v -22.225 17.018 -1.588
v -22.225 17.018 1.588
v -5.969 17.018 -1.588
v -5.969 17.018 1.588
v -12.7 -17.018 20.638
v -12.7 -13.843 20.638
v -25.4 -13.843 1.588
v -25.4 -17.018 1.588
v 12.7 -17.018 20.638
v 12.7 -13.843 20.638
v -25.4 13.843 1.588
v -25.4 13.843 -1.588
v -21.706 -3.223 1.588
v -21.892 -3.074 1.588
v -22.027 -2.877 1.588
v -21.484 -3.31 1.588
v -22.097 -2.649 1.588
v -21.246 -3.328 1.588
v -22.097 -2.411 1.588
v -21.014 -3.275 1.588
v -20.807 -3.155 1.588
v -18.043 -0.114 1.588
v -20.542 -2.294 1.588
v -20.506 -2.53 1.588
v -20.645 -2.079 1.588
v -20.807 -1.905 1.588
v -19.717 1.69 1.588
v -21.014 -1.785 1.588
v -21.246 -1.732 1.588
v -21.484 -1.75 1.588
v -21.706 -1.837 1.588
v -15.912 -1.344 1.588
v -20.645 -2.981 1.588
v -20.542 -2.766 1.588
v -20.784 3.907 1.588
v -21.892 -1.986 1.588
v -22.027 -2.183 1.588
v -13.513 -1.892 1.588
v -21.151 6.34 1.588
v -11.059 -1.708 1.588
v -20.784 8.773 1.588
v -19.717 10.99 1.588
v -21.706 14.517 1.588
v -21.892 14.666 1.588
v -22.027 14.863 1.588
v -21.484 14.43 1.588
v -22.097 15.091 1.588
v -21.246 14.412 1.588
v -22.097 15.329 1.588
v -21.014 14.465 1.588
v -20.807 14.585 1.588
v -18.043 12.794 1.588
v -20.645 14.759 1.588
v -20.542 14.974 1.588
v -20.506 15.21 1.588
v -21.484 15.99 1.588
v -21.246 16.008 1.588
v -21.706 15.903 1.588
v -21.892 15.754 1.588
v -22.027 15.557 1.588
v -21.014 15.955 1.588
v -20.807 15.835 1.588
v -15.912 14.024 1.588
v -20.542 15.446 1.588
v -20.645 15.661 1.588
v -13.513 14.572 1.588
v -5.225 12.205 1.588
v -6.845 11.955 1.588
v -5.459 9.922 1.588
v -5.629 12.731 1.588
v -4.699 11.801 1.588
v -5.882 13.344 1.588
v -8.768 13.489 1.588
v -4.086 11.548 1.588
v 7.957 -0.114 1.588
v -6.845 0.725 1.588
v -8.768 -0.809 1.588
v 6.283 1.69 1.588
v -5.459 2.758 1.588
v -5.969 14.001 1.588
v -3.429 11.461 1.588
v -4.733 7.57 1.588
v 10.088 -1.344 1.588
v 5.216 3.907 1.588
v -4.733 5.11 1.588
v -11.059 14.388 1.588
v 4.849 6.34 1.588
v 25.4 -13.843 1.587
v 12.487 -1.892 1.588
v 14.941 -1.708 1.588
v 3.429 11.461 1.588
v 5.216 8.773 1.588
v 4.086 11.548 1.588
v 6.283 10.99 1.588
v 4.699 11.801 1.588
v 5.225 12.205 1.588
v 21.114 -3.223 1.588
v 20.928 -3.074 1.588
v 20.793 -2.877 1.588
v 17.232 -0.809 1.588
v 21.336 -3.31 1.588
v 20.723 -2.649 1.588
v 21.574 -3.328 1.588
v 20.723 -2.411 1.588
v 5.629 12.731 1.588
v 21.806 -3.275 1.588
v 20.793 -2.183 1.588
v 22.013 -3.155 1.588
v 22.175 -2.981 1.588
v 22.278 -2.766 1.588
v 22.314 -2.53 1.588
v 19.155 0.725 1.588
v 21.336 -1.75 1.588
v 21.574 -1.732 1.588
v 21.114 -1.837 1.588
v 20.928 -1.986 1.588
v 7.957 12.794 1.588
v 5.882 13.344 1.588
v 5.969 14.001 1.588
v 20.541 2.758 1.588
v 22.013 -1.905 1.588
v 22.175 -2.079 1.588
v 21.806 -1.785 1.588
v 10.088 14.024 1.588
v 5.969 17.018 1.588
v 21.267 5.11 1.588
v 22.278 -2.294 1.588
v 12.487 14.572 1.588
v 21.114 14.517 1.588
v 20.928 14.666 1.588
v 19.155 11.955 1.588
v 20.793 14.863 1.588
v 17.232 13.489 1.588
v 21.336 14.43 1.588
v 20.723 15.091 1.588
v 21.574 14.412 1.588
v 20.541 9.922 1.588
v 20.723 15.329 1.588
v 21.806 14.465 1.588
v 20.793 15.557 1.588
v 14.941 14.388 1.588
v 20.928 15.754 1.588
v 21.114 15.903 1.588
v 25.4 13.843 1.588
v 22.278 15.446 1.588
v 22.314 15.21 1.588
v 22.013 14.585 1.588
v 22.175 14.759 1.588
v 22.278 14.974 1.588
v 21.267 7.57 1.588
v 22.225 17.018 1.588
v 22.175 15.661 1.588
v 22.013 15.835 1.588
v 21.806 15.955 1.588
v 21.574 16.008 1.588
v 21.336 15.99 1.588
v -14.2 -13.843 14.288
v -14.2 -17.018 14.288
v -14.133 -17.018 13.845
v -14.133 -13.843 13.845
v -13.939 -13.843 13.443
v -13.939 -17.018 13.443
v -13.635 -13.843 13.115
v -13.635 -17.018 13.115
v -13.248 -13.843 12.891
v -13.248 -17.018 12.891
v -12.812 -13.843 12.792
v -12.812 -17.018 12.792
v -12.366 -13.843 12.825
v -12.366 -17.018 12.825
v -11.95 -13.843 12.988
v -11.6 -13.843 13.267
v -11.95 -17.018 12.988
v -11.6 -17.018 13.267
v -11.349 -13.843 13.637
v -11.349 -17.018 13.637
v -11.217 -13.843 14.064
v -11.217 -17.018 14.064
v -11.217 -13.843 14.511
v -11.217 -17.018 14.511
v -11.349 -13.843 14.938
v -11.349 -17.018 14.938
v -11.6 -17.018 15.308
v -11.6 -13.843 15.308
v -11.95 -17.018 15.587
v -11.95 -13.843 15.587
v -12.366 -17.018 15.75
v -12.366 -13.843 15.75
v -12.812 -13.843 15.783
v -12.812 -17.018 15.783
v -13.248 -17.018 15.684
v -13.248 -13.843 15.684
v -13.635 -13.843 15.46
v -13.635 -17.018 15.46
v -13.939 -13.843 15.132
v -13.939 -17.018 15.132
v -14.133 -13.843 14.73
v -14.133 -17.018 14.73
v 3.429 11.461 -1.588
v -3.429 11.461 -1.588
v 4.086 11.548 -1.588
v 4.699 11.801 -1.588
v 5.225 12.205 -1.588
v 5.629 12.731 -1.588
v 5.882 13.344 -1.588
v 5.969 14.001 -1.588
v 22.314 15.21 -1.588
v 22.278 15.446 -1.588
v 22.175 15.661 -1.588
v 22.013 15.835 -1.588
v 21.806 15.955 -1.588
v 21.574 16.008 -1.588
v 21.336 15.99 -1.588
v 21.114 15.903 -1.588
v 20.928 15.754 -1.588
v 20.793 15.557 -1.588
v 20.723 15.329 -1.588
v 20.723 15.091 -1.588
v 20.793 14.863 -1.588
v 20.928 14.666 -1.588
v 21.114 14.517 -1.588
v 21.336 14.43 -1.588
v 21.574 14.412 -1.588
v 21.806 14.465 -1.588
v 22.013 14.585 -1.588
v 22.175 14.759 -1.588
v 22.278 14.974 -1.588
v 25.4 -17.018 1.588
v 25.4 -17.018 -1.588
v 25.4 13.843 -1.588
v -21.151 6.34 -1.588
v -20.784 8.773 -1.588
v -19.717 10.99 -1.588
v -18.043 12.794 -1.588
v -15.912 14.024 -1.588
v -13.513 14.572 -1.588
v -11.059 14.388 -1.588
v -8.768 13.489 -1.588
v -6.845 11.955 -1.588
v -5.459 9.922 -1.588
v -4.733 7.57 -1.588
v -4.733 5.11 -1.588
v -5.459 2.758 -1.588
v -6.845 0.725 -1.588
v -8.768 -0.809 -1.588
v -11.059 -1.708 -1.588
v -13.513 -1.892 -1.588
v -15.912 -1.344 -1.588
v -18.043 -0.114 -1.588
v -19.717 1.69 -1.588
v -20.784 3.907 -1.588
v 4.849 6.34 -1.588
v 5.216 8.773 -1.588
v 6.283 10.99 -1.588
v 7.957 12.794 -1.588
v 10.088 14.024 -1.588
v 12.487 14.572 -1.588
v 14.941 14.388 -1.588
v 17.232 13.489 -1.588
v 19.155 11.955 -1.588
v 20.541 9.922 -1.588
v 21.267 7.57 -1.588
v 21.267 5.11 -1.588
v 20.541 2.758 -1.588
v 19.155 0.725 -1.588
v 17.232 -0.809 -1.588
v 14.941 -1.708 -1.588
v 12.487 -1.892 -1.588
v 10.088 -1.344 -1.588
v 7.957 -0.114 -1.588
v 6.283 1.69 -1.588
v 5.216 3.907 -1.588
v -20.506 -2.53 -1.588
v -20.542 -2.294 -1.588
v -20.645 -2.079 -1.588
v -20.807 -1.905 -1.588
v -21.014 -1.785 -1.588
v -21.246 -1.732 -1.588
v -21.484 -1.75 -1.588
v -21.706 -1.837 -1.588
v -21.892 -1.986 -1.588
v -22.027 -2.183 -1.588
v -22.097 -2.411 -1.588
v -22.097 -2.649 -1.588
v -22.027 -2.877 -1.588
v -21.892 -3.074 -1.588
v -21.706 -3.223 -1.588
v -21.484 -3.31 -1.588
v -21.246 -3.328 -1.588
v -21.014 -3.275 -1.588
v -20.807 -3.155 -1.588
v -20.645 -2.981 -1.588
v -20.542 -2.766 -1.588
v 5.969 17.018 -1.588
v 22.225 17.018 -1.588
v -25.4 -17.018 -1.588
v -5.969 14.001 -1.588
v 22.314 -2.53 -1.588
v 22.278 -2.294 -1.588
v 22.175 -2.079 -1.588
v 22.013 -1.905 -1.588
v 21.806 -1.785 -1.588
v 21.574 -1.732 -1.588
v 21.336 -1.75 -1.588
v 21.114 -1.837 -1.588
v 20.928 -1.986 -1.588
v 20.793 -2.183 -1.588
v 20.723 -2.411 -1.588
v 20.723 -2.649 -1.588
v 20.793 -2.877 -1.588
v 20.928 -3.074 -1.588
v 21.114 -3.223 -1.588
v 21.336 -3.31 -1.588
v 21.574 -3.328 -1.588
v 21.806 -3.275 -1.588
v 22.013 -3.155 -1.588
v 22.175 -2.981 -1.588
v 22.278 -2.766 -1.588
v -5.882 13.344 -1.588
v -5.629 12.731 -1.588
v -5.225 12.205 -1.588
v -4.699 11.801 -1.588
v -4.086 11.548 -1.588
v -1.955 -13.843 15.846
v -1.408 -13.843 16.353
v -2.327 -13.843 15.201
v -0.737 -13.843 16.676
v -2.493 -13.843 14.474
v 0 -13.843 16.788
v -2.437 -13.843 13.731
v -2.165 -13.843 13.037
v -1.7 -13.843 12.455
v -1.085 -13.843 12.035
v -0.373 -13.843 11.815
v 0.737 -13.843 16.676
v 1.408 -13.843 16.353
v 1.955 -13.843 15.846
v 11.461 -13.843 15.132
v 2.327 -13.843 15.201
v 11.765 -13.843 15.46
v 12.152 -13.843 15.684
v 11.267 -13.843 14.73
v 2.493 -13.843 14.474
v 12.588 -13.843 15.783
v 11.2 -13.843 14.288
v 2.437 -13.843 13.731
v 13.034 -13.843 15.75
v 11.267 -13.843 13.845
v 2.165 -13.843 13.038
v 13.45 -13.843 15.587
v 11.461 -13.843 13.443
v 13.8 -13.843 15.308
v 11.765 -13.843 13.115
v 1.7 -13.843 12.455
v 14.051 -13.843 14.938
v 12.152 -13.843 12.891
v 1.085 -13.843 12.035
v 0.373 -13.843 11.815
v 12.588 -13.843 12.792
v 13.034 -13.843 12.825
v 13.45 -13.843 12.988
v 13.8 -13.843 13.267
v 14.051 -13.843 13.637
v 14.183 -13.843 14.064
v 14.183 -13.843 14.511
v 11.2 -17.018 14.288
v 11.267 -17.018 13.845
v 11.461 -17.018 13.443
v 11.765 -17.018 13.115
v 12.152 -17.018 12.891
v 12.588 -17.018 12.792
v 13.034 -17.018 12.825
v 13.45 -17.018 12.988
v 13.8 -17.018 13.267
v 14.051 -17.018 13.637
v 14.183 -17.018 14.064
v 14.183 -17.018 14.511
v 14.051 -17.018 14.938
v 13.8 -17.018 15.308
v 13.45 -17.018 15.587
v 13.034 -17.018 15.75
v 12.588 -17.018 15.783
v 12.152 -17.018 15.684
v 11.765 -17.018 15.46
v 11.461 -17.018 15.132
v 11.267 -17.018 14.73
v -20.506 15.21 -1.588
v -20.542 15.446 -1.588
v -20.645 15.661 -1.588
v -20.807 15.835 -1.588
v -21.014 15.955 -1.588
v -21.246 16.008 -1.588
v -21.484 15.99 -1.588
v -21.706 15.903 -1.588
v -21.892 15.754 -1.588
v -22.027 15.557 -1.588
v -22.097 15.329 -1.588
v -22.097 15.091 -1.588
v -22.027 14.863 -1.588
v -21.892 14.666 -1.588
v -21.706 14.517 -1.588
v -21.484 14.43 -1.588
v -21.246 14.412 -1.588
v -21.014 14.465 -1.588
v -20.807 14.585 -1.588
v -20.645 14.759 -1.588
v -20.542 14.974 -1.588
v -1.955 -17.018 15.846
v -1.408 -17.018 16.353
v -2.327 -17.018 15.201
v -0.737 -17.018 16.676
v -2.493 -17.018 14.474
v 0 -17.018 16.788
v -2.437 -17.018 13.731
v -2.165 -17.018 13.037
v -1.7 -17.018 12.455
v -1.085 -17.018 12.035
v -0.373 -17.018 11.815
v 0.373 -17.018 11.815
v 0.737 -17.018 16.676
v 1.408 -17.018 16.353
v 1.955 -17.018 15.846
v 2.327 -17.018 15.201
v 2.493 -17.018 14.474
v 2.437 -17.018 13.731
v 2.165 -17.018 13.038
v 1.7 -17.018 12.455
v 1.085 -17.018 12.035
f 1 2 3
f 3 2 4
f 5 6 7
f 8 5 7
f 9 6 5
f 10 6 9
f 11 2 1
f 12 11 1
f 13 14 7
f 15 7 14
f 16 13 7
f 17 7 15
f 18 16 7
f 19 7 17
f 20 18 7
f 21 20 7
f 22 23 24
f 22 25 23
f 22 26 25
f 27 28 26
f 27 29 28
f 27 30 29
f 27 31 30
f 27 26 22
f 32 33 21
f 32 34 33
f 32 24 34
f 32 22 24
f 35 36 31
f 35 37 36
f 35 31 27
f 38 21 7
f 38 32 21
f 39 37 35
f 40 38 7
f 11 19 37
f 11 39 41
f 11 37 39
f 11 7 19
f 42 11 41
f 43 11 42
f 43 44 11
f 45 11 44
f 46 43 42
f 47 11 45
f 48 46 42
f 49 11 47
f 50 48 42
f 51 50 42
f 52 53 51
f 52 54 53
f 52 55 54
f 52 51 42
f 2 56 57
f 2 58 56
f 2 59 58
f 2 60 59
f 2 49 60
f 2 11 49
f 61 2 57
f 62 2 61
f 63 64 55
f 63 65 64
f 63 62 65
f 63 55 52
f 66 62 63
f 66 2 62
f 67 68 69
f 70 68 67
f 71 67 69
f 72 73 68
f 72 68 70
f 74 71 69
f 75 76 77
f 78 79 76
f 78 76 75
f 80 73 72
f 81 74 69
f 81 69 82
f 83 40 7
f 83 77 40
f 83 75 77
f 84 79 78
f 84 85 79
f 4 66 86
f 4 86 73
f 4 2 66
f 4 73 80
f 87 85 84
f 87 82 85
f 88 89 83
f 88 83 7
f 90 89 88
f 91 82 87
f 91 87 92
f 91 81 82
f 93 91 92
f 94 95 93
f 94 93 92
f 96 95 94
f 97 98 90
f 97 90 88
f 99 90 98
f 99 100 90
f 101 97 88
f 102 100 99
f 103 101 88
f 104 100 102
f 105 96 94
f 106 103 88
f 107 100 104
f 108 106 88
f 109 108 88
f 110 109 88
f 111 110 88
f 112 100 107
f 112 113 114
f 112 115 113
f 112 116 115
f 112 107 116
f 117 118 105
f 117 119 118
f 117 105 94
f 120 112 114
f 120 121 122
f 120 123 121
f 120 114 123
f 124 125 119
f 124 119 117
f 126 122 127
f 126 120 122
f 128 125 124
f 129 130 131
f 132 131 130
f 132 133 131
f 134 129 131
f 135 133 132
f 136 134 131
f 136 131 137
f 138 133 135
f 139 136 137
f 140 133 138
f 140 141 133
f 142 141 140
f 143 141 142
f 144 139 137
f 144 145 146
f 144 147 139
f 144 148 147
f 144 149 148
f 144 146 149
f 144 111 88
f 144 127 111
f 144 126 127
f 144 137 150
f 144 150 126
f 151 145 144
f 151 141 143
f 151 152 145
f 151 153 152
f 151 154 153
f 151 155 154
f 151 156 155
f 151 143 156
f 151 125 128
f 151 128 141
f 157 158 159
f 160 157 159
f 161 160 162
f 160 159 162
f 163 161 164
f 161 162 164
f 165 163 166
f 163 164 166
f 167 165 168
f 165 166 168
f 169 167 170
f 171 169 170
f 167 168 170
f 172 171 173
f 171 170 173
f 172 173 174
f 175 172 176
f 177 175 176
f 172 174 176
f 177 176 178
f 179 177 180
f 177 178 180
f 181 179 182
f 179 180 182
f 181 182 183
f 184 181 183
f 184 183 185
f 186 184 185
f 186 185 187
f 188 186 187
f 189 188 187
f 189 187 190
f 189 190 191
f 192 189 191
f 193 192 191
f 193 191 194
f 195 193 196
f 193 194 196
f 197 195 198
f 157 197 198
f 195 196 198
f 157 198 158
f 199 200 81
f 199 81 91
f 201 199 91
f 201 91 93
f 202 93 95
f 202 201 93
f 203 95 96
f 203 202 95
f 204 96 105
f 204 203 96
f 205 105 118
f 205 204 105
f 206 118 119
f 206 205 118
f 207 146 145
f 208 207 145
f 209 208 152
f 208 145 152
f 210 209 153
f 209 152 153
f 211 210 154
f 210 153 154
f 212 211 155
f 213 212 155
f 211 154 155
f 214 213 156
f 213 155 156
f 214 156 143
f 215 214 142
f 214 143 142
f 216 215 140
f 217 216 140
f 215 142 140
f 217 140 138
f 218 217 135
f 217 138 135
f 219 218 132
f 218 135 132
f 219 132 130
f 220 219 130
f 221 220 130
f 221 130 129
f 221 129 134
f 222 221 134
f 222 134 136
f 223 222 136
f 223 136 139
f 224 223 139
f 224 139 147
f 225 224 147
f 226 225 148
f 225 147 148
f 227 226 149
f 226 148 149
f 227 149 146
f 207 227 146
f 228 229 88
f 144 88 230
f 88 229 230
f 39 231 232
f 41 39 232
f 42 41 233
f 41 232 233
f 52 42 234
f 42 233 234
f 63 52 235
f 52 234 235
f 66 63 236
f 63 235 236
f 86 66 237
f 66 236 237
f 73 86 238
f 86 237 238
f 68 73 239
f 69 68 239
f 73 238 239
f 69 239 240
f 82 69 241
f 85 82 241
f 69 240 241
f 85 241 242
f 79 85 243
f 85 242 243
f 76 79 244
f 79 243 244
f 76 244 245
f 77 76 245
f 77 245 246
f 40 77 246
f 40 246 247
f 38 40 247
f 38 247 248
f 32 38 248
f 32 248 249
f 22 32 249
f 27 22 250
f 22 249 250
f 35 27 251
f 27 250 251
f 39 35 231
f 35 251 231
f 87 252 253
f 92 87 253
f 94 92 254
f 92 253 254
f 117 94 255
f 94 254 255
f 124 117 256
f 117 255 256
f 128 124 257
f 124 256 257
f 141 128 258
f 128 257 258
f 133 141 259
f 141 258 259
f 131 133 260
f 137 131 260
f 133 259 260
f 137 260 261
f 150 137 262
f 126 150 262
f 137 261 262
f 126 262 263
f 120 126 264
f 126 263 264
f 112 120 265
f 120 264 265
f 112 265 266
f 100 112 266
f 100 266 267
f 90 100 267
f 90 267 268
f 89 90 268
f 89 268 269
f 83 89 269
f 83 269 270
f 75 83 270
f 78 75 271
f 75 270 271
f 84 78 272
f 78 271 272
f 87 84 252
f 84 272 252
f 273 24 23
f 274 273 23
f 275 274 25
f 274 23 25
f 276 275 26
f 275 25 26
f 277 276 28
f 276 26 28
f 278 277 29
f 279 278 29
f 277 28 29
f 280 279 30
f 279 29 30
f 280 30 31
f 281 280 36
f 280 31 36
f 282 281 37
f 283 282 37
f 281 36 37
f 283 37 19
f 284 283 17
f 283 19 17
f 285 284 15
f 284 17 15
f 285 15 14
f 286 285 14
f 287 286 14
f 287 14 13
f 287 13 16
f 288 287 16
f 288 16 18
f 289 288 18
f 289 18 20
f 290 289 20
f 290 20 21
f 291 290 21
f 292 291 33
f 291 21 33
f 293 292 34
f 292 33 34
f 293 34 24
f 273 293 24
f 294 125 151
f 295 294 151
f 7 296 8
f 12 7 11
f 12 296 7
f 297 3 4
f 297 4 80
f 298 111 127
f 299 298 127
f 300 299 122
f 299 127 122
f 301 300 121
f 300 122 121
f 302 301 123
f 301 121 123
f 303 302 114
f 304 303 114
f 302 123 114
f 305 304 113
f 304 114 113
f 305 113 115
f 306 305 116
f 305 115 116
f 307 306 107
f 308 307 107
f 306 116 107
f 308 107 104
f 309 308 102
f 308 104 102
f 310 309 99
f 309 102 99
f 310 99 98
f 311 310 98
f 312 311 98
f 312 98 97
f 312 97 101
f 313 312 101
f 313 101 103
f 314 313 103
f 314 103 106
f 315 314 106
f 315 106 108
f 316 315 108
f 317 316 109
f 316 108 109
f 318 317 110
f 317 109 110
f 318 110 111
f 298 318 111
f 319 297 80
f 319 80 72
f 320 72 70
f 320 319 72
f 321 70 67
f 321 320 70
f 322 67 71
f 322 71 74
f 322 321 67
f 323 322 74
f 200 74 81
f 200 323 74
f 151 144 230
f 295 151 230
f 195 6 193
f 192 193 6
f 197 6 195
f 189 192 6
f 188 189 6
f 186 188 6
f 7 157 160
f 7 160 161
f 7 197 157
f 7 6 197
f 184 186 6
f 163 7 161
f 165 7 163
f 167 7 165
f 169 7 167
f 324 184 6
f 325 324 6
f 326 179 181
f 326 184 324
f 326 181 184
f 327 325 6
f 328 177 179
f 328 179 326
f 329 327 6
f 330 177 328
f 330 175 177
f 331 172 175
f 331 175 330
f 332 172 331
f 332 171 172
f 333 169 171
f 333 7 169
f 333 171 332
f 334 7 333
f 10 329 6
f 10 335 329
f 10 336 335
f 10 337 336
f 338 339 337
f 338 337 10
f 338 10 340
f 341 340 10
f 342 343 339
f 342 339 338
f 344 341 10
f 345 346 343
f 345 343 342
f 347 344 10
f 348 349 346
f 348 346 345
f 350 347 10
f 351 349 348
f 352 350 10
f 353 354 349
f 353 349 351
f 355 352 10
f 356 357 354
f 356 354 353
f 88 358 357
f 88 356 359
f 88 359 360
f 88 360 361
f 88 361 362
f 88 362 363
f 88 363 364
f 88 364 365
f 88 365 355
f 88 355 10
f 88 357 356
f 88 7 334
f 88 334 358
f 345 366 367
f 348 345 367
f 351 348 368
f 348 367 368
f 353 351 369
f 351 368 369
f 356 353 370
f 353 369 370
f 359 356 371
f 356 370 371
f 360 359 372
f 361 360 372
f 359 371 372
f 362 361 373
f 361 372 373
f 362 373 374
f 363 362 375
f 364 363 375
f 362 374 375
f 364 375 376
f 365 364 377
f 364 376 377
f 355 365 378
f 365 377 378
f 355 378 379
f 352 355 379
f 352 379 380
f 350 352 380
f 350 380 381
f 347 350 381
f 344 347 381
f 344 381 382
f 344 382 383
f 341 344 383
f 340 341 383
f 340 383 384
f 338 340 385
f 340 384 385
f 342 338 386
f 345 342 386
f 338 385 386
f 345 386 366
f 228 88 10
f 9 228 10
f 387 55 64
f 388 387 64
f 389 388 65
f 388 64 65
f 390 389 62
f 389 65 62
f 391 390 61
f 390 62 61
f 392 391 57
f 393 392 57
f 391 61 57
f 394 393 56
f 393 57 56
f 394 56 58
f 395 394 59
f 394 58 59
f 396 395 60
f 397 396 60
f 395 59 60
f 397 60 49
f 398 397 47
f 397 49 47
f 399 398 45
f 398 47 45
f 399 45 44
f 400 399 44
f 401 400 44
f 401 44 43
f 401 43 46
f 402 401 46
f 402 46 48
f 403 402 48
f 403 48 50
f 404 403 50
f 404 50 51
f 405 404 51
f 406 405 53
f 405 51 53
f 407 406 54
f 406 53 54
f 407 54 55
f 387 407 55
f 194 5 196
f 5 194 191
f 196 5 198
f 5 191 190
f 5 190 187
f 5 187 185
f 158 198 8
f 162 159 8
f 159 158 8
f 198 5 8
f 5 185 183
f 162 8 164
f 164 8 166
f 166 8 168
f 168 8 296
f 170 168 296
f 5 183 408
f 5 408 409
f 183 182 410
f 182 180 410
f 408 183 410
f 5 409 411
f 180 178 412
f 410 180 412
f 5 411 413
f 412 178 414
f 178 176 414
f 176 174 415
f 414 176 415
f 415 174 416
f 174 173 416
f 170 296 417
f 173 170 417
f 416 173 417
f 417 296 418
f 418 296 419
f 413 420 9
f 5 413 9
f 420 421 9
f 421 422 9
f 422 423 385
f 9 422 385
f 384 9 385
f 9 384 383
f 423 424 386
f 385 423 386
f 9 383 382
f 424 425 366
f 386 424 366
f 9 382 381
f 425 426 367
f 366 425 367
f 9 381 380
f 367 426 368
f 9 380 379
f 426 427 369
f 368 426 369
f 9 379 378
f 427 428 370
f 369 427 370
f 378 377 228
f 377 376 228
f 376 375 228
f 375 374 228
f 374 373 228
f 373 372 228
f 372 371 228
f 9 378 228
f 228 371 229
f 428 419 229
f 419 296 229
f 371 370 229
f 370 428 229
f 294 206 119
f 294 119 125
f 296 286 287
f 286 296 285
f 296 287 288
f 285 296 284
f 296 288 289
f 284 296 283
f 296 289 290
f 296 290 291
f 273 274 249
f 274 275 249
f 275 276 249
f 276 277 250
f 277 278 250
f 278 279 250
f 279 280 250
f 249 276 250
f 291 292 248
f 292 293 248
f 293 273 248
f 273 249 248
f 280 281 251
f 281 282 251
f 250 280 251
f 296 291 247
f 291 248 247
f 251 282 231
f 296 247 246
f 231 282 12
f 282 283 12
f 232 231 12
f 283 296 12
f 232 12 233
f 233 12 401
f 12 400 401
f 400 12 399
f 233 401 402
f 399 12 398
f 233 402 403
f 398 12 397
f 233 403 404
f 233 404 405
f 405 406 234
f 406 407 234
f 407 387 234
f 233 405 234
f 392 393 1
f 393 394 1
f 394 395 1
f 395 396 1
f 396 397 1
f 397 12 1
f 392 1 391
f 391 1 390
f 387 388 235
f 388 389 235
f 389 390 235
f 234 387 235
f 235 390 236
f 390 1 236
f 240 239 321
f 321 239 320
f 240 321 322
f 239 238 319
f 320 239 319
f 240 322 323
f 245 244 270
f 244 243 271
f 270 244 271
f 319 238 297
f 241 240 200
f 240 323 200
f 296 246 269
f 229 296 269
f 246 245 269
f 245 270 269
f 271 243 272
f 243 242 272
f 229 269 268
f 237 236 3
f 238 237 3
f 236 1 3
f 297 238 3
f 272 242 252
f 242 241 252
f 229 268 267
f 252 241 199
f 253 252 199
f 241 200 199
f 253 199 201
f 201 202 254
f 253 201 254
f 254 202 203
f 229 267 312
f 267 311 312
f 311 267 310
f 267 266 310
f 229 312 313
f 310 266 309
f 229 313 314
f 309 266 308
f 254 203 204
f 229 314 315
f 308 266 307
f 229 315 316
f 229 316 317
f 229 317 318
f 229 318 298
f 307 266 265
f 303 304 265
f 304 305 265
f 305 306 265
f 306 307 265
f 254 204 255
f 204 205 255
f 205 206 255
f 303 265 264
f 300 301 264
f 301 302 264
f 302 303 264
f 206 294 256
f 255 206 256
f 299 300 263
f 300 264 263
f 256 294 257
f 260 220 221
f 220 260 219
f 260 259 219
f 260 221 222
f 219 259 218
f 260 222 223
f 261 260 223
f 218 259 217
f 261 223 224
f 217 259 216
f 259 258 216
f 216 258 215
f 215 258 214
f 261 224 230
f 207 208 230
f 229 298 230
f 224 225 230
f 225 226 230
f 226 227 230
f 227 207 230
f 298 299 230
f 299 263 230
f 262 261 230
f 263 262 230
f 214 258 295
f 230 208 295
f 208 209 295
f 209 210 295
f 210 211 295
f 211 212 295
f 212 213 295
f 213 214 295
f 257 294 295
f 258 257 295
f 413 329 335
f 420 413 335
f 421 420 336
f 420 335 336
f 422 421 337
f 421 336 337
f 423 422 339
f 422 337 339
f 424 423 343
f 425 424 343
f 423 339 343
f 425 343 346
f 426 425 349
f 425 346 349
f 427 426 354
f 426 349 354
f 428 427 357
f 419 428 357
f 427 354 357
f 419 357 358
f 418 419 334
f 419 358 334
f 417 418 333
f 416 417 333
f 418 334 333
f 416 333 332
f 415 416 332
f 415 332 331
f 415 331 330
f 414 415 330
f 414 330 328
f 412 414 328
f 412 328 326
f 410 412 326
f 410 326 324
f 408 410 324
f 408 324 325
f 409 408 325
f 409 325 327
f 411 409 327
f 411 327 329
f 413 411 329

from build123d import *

# Parameters (mm, degrees)
SKETCH1_W             = 50.8
SKETCH1_H             = 34.036
BOSS_EXTRUDE1_DEPTH   = 1.5875
SKETCH2_W             = 50.8
SKETCH2_H             = 3.175
BOSS_EXTRUDE2_DEPTH   = 19.05
CHAMFER1_SIZE         = 12.7
F_3_0MM_DOWEL_HOLE1_D = 3
CHAMFER2_SIZE         = 3.175
CUT_EXTRUDE1_DEPTH    = 3.175
SKETCH7_R             = 8.255
CUT_EXTRUDE3_DEPTH    = 3.175
SKETCH8_R             = 8.255
CUT_EXTRUDE4_DEPTH    = 3.175
SKETCH9_R             = 0.8
CUT_EXTRUDE5_DEPTH    = 3.175
CUT_EXTRUDE6_DEPTH    = 3.175
SKETCH13_R            = 2.5
SKETCH13_R_2          = 1.5
CUT_EXTRUDE7_DEPTH    = 45.982971525


with BuildPart() as part:
    # Sketch1 → Boss-Extrude1 (new, symmetric)
    with BuildSketch(Plane.XY):
        Rectangle(SKETCH1_W, SKETCH1_H)
    extrude(amount=BOSS_EXTRUDE1_DEPTH, both=True)

    # Sketch2 → Boss-Extrude2 (add)
    with BuildSketch(Plane.XY.offset(1.5875)):
        with Locations((0, -15.4305)):
            Rectangle(SKETCH2_W, SKETCH2_H)
    extrude(amount=BOSS_EXTRUDE2_DEPTH)

    # Chamfer1
    chamfer1_edges = [part.edges().sort_by_distance(p)[0] for p in [
        (-25.4, -15.4305, 20.6375),
        (25.4, -15.4305, 20.6375),
    ]]
    chamfer(chamfer1_edges, length=CHAMFER1_SIZE)

    # Ø3.0mm Dowel Hole1 (through all)
    with Locations(Plane(origin=(0, -13.843, 0), x_dir=(1, 0, 0), z_dir=(0, 1, 0))):
        with Locations((-12.7, -14.2875), (12.7, -14.2875)):
            Hole(F_3_0MM_DOWEL_HOLE1_D / 2)

    # Chamfer2
    chamfer2_edges = [part.edges().sort_by_distance(p)[0] for p in [
        (25.4, 17.018, 0),
        (-25.4, 17.018, 0),
    ]]
    chamfer(chamfer2_edges, length=CHAMFER2_SIZE)

    # Sketch5 → Cut-Extrude1 (cut)
    with BuildSketch(Plane(origin=(0, 0, -1.5875), x_dir=(-1, 0, 0), z_dir=(0, 0, -1))):
        with BuildLine():
            Line((-5.969, 14.001104381), (-5.969, 17.018))
            Line((-5.969, 17.018), (5.969, 17.018))
            Line((5.969, 17.018), (5.969, 14.001104381))
            ThreePointArc((5.969, 14.001104381), (5.225051224, 12.205053157), (3.429, 11.461104381))
            Line((3.429, 11.461104381), (-3.429, 11.461104381))
            ThreePointArc((-3.429, 11.461104381), (-5.225051224, 12.205053157), (-5.969, 14.001104381))
        make_face()
    extrude(amount=-CUT_EXTRUDE1_DEPTH, mode=Mode.SUBTRACT)

    # Sketch7 → Cut-Extrude3 (cut)
    with BuildSketch(Plane(origin=(0, 0, -1.5875), x_dir=(-1, 0, 0), z_dir=(0, 0, -1))):
        with Locations((12.896, 6.34)):
            Circle(SKETCH7_R)
    extrude(amount=-CUT_EXTRUDE3_DEPTH, mode=Mode.SUBTRACT)

    # Sketch8 → Cut-Extrude4 (cut)
    with BuildSketch(Plane(origin=(0, 0, -1.5875), x_dir=(-1, 0, 0), z_dir=(0, 0, -1))):
        with Locations((-13.104, 6.34)):
            Circle(SKETCH8_R)
    extrude(amount=-CUT_EXTRUDE4_DEPTH, mode=Mode.SUBTRACT)

    # Sketch9 → Cut-Extrude5 (cut)
    with BuildSketch(Plane.XY.offset(1.5875)):
        with Locations((-21.306, 15.21)):
            Circle(SKETCH9_R)
        with Locations((21.514, 15.21)):
            Circle(SKETCH9_R)
        with Locations((21.514, -2.53)):
            Circle(SKETCH9_R)
        with Locations((-21.306, -2.53)):
            Circle(SKETCH9_R)
    extrude(amount=-CUT_EXTRUDE5_DEPTH, mode=Mode.SUBTRACT)

    # Sketch11 → Cut-Extrude6 (cut)
    with BuildSketch(Plane(origin=(0, -13.843, 0), x_dir=(1, 0, 0), z_dir=(0, 1, 0))):
        Polygon((-12.7, -20.6375), (-25.4, -1.5875), (-25.4, -7.9375), align=None)
        Polygon((25.4, -1.5875), (12.7, -20.6375), (25.4, -7.9375), align=None)
    extrude(amount=-CUT_EXTRUDE6_DEPTH, mode=Mode.SUBTRACT)

    # Sketch13 → Cut-Extrude7 (cut, through all)
    with BuildSketch(Plane(origin=(0, -13.843, 0), x_dir=(1, 0, 0), z_dir=(0, 1, 0))):
        with Locations(Location((0, -14.2875, 0), (0, 0, 270))):
            Circle(SKETCH13_R)
        with Locations(Location((-12.7, -14.2875, 0), (0, 0, 270))):
            Circle(SKETCH13_R_2)
        with Locations(Location((12.7, -14.2875, 0), (0, 0, 270))):
            Circle(SKETCH13_R_2)
    extrude(amount=-CUT_EXTRUDE7_DEPTH, mode=Mode.SUBTRACT)


solid = part.part
